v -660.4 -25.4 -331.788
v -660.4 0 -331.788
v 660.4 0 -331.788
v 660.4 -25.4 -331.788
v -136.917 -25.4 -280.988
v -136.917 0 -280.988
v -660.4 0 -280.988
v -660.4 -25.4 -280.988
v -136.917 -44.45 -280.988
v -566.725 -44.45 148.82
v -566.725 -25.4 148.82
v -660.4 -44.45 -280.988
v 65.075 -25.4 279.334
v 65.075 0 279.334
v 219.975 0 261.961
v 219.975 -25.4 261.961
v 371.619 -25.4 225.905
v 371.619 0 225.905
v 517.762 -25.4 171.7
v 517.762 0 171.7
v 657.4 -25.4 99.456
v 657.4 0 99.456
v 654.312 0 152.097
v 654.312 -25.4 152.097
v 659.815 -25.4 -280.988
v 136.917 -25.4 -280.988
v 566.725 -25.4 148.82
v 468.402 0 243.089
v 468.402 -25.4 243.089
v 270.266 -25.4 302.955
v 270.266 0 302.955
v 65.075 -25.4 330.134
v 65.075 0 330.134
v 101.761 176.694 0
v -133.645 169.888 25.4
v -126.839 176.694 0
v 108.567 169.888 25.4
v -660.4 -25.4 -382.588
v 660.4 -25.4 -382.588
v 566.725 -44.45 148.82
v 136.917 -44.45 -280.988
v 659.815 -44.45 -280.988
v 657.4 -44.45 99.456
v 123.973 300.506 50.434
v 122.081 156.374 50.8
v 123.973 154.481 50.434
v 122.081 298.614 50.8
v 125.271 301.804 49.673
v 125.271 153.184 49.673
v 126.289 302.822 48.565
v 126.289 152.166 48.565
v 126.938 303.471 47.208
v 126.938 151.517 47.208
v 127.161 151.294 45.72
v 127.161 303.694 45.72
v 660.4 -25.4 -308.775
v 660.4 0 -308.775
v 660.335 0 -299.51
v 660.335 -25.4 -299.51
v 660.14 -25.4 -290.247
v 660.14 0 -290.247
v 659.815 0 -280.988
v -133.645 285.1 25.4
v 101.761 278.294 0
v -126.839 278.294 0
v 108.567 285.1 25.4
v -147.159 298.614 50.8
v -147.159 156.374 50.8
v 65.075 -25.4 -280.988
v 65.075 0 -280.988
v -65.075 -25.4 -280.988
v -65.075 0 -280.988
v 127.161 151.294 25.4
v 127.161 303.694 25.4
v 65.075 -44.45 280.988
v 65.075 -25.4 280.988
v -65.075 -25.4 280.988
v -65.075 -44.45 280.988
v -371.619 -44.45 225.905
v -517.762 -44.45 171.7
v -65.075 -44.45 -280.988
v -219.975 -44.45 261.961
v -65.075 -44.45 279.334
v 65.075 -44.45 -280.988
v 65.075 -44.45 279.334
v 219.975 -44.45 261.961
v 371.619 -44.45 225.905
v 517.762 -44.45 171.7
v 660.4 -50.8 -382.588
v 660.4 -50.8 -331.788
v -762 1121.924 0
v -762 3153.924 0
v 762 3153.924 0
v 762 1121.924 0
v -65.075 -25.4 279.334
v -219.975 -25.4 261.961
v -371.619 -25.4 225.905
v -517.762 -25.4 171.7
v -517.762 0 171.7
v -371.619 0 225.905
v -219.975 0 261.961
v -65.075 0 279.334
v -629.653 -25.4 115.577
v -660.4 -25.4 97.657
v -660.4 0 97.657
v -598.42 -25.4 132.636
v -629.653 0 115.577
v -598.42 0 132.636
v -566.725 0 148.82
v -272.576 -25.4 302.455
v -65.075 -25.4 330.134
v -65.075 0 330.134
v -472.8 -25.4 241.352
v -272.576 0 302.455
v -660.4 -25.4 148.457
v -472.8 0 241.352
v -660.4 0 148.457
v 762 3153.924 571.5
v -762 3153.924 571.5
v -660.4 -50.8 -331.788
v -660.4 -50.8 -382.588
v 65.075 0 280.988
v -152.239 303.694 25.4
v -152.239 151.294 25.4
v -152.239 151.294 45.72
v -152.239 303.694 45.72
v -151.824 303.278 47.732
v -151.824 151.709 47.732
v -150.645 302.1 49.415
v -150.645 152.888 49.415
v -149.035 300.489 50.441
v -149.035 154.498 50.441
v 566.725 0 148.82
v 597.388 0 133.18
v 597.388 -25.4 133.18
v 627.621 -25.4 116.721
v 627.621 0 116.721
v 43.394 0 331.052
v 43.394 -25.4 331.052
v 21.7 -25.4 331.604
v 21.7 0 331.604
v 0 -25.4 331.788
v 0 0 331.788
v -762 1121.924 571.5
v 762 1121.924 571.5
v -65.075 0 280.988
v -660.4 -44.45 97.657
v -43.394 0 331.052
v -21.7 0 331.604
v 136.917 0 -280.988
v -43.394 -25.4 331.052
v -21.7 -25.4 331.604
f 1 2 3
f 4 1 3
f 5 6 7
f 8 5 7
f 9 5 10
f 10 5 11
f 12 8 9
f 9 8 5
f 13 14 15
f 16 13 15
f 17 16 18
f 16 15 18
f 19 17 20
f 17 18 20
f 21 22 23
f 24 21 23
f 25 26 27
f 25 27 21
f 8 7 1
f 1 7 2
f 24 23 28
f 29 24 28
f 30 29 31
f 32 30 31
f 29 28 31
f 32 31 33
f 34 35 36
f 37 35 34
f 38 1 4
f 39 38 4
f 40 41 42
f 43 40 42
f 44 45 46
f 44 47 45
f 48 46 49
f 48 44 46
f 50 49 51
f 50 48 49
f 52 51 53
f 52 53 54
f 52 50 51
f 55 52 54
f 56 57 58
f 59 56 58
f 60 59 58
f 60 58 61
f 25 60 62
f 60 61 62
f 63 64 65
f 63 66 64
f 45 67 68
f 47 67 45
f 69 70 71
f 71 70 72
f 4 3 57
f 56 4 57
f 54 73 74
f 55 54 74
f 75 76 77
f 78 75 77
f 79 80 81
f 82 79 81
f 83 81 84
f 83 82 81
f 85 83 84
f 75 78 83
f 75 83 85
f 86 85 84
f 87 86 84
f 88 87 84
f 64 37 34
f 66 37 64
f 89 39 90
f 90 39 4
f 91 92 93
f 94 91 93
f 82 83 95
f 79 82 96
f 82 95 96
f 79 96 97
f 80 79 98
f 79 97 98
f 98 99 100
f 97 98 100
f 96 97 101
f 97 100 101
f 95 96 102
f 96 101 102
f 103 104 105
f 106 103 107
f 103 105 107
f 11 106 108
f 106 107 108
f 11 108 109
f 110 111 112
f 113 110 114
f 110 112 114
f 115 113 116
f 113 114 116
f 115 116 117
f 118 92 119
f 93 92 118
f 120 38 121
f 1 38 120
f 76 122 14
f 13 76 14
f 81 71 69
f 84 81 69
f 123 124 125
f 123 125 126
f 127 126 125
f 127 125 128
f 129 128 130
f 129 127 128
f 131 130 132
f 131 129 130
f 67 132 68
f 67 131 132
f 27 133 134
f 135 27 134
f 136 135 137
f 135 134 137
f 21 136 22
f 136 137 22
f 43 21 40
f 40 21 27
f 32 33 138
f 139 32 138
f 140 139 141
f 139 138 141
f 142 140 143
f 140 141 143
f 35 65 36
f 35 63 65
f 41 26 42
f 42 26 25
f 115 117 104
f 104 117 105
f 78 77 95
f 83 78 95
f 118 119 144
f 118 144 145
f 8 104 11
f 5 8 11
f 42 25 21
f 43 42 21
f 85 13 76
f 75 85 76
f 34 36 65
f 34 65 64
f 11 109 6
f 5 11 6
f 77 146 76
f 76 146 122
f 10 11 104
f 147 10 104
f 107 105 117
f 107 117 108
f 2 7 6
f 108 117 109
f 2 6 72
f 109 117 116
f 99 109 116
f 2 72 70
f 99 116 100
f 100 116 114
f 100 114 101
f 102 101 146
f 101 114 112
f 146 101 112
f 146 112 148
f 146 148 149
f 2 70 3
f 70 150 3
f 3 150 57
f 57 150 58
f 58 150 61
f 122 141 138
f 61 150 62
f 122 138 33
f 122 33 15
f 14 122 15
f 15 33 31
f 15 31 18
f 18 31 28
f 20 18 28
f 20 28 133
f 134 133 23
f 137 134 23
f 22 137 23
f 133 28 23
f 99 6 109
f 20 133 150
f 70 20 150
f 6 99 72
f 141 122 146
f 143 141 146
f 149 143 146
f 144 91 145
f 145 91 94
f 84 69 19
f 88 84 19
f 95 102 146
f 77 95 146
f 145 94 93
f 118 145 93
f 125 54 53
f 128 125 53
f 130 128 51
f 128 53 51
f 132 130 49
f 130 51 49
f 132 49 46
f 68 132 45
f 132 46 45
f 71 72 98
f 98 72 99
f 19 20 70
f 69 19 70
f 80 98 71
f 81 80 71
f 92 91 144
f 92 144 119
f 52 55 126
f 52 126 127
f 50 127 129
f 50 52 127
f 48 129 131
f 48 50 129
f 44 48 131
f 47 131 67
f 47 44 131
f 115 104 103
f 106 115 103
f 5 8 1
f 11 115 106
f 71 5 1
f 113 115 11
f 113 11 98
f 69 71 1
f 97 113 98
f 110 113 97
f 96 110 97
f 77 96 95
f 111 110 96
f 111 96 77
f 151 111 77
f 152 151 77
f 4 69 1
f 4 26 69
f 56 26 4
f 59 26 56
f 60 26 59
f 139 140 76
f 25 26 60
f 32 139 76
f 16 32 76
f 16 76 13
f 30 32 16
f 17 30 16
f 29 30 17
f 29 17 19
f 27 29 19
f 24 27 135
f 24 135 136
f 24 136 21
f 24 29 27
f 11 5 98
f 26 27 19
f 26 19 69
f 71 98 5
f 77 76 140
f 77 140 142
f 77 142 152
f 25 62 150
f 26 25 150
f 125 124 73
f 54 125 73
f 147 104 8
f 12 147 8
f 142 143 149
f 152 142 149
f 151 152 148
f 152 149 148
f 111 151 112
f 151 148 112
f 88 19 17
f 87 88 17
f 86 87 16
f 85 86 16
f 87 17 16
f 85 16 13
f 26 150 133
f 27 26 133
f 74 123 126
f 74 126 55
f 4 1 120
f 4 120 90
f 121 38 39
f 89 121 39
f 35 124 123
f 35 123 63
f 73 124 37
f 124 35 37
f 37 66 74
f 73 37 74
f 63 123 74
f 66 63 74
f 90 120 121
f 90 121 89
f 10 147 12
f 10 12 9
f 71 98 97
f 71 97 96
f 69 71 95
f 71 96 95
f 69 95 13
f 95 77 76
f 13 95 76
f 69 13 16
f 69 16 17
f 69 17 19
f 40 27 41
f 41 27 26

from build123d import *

# Parameters (mm, degrees)
F1_DEPTH  = 25.4
F2_W      = 1320.8
F2_H      = 50.8
F3_DEPTH  = 25.4
F4_W      = 228.6
F4_H      = 101.6
F5_DEPTH  = 25.4
F5_TAPER  = -15
F6_W      = 279.4
F6_H      = 152.4
F6_W_2    = 242.2118189755
F6_H_2    = 115.2118189755
F7_DEPTH  = 25.4
F8_R      = 5.08
F9_W      = 1524
F9_H      = 2032
F10_DEPTH = 571.5
F12_DEPTH = 19.05


with BuildPart() as f1:
    # F0 (on Front) → F1 (new body)
    with BuildSketch(Plane.XZ):
        with BuildLine():
            ThreePointArc((-517.7624135276, 171.7001135276), (-542.3642599869, 160.5184883538), (-566.7247843556, 148.8204353871))
            Line((-566.7247843556, 148.8204353871), (-327.3396312481, -90.5647177205))
            Line((-327.3396312481, -90.5647177205), (-136.9168489686, -280.9875))
            Line((-136.9168489686, -280.9875), (-65.0748, -280.9875))
            Line((-65.0748, -280.9875), (-517.7624135276, 171.7001135276))
        make_face()
        with BuildLine():
            Line((92.3055559397, -280.9875), (65.0748, -280.9875))
            Line((65.0748, -280.9875), (-65.0748, -280.9875))
            Line((-65.0748, -280.9875), (-136.9168489686, -280.9875))
            Line((-136.9168489686, -280.9875), (-659.8151326593, -280.9875))
            Line((-659.8151326593, -280.9875), (-660.4, -280.9875))
            Line((-660.4, -280.9875), (-660.4, -331.7875))
            Line((-660.4, -331.7875), (660.4, -331.7875))
            Line((660.4, -331.7875), (660.4, -308.7751))
            ThreePointArc((660.4, -308.7751), (660.2537669746, -294.8782228007), (659.8151326593, -280.9875))
            Line((659.8151326593, -280.9875), (136.9168489686, -280.9875))
            Line((136.9168489686, -280.9875), (92.3055559397, -280.9875))
        make_face()
        with BuildLine():
            Line((327.3396312481, -90.5647177205), (566.7247843556, 148.8204353871))
            ThreePointArc((566.7247843556, 148.8204353871), (542.3642599869, 160.5184883538), (517.7624135276, 171.7001135276))
            Line((517.7624135276, 171.7001135276), (65.0748, -280.9875))
            Line((65.0748, -280.9875), (92.3055559397, -280.9875))
            Line((92.3055559397, -280.9875), (136.9168489686, -280.9875))
            Line((136.9168489686, -280.9875), (327.3396312481, -90.5647177205))
        make_face()
        with BuildLine():
            ThreePointArc((65.0748, 330.1336941624), (32.5479057267, 331.3739818035), (0, 331.7875))
            ThreePointArc((0, 331.7875), (-32.5479057267, 331.3739818035), (-65.0748, 330.1336941624))
            ThreePointArc((-65.0748, 330.1336941624), (-373.9385103205, 275.9997100934), (-660.4, 148.4571888909))
            Line((-660.4, 148.4571888909), (-660.4, 97.6571888909))
            ThreePointArc((-660.4, 97.6571888909), (-614.0954555629, 124.2148023462), (-566.7247843556, 148.8204353871))
            ThreePointArc((-566.7247843556, 148.8204353871), (-542.3642599869, 160.5184883538), (-517.7624135276, 171.7001135276))
            ThreePointArc((-517.7624135276, 171.7001135276), (-296.3461679999, 246.2413461921), (-65.0748, 279.3336941624))
            Line((-65.0748, 279.3336941624), (-65.0748, 280.9875))
            Line((-65.0748, 280.9875), (0, 280.9875))
            Line((0, 280.9875), (65.0748, 280.9875))
            Line((65.0748, 280.9875), (65.0748, 279.3336941624))
            ThreePointArc((65.0748, 279.3336941624), (296.3461679999, 246.2413461921), (517.7624135276, 171.7001135276))
            ThreePointArc((517.7624135276, 171.7001135276), (542.3642599869, 160.5184883538), (566.7247843556, 148.8204353871))
            ThreePointArc((566.7247843556, 148.8204353871), (612.5598727198, 125.0521419416), (657.4000349064, 99.4563033395))
            Line((657.4000349064, 99.4563033395), (654.3120220333, 152.0966175595))
            ThreePointArc((654.3120220333, 152.0966175595), (370.5450716042, 277.0301599771), (65.0748, 330.1336941624))
        make_face()
    extrude(amount=F1_DEPTH)


with BuildPart() as f3:
    # F2 (on face) → F3 (new body)
    with BuildSketch(Plane.XZ.offset(25.4)):
        with Locations((0, -357.1875)):
            Rectangle(F2_W, F2_H)
    extrude(amount=F3_DEPTH)


with BuildPart() as f5:
    # F4 (on Top) → F5 (new body)
    with BuildSketch(Plane.XY):
        with Locations((-12.5393885701, 227.4938076735)):
            Rectangle(F4_W, F4_H)
    extrude(amount=F5_DEPTH, taper=F5_TAPER)

    # F6 (on face) → F7 (join)
    with BuildSketch(Plane.XY.offset(25.4)):
        with Locations((-12.5393885701, 227.4938076735)):
            Rectangle(F6_W, F6_H)
        with Locations((-12.5393885701, 227.4938076735)):
            Rectangle(F6_W_2, F6_H_2, mode=Mode.SUBTRACT)
        with Locations((-12.5393885701, 227.4938076735)):
            Rectangle(F6_W_2, F6_H_2)
    extrude(amount=F7_DEPTH)

    # F8
    f8_edges = [f5.edges().sort_by_distance(p)[0] for p in [
        (127.160611, 227.493808, 50.8),
        (-12.539389, 151.293808, 50.8),
        (-12.539389, 303.693808, 50.8),
        (-152.239389, 227.493808, 50.8),
    ]]
    fillet(f8_edges, radius=F8_R)


with BuildPart() as f10:
    # F9 (on Top) → F10 (new body)
    with BuildSketch(Plane.XY):
        with Locations((0, 2137.9242895666)):
            Rectangle(F9_W, F9_H)
    extrude(amount=F10_DEPTH)


with BuildPart() as f12:
    # F11 (on face) → F12 (new body)
    with BuildSketch(Plane.XZ.offset(25.4)):
        Polygon((659.8151326593, -280.9875), (657.4000349064, 99.4563033395), (566.7247843556, 148.8204353871), (136.9168489686, -280.9875), align=None)
    extrude(amount=F12_DEPTH)


with BuildPart() as f12b:
    # F11 (on face) → F12, piece 2 (new body)
    with BuildSketch(Plane.XZ.offset(25.4)):
        with BuildLine():
            Line((65.0748, -280.9875), (517.7624135276, 171.7001135276))
            ThreePointArc((517.7624135276, 171.7001135276), (296.3461679999, 246.2413461921), (65.0748, 279.3336941624))
            Line((65.0748, 279.3336941624), (65.0748, 280.9875))
            Line((65.0748, 280.9875), (-65.0748, 280.9875))
            Line((-65.0748, 280.9875), (-65.0748, 279.3336941624))
            ThreePointArc((-65.0748, 279.3336941624), (-296.3461679999, 246.2413461921), (-517.7624135276, 171.7001135276))
            Line((-517.7624135276, 171.7001135276), (-65.0748, -280.9875))
            Line((-65.0748, -280.9875), (65.0748, -280.9875))
        make_face()
    extrude(amount=F12_DEPTH)


with BuildPart() as f12c:
    # F11 (on face) → F12, piece 3 (new body)
    with BuildSketch(Plane.XZ.offset(25.4)):
        Polygon((-566.7247843556, 148.8204353871), (-660.4, 97.6571888909), (-660.4, -280.9875), (-136.9168489686, -280.9875), align=None)
    extrude(amount=F12_DEPTH)


solid = Compound([f1.part, f3.part, f5.part, f10.part, f12.part, f12b.part, f12c.part])
